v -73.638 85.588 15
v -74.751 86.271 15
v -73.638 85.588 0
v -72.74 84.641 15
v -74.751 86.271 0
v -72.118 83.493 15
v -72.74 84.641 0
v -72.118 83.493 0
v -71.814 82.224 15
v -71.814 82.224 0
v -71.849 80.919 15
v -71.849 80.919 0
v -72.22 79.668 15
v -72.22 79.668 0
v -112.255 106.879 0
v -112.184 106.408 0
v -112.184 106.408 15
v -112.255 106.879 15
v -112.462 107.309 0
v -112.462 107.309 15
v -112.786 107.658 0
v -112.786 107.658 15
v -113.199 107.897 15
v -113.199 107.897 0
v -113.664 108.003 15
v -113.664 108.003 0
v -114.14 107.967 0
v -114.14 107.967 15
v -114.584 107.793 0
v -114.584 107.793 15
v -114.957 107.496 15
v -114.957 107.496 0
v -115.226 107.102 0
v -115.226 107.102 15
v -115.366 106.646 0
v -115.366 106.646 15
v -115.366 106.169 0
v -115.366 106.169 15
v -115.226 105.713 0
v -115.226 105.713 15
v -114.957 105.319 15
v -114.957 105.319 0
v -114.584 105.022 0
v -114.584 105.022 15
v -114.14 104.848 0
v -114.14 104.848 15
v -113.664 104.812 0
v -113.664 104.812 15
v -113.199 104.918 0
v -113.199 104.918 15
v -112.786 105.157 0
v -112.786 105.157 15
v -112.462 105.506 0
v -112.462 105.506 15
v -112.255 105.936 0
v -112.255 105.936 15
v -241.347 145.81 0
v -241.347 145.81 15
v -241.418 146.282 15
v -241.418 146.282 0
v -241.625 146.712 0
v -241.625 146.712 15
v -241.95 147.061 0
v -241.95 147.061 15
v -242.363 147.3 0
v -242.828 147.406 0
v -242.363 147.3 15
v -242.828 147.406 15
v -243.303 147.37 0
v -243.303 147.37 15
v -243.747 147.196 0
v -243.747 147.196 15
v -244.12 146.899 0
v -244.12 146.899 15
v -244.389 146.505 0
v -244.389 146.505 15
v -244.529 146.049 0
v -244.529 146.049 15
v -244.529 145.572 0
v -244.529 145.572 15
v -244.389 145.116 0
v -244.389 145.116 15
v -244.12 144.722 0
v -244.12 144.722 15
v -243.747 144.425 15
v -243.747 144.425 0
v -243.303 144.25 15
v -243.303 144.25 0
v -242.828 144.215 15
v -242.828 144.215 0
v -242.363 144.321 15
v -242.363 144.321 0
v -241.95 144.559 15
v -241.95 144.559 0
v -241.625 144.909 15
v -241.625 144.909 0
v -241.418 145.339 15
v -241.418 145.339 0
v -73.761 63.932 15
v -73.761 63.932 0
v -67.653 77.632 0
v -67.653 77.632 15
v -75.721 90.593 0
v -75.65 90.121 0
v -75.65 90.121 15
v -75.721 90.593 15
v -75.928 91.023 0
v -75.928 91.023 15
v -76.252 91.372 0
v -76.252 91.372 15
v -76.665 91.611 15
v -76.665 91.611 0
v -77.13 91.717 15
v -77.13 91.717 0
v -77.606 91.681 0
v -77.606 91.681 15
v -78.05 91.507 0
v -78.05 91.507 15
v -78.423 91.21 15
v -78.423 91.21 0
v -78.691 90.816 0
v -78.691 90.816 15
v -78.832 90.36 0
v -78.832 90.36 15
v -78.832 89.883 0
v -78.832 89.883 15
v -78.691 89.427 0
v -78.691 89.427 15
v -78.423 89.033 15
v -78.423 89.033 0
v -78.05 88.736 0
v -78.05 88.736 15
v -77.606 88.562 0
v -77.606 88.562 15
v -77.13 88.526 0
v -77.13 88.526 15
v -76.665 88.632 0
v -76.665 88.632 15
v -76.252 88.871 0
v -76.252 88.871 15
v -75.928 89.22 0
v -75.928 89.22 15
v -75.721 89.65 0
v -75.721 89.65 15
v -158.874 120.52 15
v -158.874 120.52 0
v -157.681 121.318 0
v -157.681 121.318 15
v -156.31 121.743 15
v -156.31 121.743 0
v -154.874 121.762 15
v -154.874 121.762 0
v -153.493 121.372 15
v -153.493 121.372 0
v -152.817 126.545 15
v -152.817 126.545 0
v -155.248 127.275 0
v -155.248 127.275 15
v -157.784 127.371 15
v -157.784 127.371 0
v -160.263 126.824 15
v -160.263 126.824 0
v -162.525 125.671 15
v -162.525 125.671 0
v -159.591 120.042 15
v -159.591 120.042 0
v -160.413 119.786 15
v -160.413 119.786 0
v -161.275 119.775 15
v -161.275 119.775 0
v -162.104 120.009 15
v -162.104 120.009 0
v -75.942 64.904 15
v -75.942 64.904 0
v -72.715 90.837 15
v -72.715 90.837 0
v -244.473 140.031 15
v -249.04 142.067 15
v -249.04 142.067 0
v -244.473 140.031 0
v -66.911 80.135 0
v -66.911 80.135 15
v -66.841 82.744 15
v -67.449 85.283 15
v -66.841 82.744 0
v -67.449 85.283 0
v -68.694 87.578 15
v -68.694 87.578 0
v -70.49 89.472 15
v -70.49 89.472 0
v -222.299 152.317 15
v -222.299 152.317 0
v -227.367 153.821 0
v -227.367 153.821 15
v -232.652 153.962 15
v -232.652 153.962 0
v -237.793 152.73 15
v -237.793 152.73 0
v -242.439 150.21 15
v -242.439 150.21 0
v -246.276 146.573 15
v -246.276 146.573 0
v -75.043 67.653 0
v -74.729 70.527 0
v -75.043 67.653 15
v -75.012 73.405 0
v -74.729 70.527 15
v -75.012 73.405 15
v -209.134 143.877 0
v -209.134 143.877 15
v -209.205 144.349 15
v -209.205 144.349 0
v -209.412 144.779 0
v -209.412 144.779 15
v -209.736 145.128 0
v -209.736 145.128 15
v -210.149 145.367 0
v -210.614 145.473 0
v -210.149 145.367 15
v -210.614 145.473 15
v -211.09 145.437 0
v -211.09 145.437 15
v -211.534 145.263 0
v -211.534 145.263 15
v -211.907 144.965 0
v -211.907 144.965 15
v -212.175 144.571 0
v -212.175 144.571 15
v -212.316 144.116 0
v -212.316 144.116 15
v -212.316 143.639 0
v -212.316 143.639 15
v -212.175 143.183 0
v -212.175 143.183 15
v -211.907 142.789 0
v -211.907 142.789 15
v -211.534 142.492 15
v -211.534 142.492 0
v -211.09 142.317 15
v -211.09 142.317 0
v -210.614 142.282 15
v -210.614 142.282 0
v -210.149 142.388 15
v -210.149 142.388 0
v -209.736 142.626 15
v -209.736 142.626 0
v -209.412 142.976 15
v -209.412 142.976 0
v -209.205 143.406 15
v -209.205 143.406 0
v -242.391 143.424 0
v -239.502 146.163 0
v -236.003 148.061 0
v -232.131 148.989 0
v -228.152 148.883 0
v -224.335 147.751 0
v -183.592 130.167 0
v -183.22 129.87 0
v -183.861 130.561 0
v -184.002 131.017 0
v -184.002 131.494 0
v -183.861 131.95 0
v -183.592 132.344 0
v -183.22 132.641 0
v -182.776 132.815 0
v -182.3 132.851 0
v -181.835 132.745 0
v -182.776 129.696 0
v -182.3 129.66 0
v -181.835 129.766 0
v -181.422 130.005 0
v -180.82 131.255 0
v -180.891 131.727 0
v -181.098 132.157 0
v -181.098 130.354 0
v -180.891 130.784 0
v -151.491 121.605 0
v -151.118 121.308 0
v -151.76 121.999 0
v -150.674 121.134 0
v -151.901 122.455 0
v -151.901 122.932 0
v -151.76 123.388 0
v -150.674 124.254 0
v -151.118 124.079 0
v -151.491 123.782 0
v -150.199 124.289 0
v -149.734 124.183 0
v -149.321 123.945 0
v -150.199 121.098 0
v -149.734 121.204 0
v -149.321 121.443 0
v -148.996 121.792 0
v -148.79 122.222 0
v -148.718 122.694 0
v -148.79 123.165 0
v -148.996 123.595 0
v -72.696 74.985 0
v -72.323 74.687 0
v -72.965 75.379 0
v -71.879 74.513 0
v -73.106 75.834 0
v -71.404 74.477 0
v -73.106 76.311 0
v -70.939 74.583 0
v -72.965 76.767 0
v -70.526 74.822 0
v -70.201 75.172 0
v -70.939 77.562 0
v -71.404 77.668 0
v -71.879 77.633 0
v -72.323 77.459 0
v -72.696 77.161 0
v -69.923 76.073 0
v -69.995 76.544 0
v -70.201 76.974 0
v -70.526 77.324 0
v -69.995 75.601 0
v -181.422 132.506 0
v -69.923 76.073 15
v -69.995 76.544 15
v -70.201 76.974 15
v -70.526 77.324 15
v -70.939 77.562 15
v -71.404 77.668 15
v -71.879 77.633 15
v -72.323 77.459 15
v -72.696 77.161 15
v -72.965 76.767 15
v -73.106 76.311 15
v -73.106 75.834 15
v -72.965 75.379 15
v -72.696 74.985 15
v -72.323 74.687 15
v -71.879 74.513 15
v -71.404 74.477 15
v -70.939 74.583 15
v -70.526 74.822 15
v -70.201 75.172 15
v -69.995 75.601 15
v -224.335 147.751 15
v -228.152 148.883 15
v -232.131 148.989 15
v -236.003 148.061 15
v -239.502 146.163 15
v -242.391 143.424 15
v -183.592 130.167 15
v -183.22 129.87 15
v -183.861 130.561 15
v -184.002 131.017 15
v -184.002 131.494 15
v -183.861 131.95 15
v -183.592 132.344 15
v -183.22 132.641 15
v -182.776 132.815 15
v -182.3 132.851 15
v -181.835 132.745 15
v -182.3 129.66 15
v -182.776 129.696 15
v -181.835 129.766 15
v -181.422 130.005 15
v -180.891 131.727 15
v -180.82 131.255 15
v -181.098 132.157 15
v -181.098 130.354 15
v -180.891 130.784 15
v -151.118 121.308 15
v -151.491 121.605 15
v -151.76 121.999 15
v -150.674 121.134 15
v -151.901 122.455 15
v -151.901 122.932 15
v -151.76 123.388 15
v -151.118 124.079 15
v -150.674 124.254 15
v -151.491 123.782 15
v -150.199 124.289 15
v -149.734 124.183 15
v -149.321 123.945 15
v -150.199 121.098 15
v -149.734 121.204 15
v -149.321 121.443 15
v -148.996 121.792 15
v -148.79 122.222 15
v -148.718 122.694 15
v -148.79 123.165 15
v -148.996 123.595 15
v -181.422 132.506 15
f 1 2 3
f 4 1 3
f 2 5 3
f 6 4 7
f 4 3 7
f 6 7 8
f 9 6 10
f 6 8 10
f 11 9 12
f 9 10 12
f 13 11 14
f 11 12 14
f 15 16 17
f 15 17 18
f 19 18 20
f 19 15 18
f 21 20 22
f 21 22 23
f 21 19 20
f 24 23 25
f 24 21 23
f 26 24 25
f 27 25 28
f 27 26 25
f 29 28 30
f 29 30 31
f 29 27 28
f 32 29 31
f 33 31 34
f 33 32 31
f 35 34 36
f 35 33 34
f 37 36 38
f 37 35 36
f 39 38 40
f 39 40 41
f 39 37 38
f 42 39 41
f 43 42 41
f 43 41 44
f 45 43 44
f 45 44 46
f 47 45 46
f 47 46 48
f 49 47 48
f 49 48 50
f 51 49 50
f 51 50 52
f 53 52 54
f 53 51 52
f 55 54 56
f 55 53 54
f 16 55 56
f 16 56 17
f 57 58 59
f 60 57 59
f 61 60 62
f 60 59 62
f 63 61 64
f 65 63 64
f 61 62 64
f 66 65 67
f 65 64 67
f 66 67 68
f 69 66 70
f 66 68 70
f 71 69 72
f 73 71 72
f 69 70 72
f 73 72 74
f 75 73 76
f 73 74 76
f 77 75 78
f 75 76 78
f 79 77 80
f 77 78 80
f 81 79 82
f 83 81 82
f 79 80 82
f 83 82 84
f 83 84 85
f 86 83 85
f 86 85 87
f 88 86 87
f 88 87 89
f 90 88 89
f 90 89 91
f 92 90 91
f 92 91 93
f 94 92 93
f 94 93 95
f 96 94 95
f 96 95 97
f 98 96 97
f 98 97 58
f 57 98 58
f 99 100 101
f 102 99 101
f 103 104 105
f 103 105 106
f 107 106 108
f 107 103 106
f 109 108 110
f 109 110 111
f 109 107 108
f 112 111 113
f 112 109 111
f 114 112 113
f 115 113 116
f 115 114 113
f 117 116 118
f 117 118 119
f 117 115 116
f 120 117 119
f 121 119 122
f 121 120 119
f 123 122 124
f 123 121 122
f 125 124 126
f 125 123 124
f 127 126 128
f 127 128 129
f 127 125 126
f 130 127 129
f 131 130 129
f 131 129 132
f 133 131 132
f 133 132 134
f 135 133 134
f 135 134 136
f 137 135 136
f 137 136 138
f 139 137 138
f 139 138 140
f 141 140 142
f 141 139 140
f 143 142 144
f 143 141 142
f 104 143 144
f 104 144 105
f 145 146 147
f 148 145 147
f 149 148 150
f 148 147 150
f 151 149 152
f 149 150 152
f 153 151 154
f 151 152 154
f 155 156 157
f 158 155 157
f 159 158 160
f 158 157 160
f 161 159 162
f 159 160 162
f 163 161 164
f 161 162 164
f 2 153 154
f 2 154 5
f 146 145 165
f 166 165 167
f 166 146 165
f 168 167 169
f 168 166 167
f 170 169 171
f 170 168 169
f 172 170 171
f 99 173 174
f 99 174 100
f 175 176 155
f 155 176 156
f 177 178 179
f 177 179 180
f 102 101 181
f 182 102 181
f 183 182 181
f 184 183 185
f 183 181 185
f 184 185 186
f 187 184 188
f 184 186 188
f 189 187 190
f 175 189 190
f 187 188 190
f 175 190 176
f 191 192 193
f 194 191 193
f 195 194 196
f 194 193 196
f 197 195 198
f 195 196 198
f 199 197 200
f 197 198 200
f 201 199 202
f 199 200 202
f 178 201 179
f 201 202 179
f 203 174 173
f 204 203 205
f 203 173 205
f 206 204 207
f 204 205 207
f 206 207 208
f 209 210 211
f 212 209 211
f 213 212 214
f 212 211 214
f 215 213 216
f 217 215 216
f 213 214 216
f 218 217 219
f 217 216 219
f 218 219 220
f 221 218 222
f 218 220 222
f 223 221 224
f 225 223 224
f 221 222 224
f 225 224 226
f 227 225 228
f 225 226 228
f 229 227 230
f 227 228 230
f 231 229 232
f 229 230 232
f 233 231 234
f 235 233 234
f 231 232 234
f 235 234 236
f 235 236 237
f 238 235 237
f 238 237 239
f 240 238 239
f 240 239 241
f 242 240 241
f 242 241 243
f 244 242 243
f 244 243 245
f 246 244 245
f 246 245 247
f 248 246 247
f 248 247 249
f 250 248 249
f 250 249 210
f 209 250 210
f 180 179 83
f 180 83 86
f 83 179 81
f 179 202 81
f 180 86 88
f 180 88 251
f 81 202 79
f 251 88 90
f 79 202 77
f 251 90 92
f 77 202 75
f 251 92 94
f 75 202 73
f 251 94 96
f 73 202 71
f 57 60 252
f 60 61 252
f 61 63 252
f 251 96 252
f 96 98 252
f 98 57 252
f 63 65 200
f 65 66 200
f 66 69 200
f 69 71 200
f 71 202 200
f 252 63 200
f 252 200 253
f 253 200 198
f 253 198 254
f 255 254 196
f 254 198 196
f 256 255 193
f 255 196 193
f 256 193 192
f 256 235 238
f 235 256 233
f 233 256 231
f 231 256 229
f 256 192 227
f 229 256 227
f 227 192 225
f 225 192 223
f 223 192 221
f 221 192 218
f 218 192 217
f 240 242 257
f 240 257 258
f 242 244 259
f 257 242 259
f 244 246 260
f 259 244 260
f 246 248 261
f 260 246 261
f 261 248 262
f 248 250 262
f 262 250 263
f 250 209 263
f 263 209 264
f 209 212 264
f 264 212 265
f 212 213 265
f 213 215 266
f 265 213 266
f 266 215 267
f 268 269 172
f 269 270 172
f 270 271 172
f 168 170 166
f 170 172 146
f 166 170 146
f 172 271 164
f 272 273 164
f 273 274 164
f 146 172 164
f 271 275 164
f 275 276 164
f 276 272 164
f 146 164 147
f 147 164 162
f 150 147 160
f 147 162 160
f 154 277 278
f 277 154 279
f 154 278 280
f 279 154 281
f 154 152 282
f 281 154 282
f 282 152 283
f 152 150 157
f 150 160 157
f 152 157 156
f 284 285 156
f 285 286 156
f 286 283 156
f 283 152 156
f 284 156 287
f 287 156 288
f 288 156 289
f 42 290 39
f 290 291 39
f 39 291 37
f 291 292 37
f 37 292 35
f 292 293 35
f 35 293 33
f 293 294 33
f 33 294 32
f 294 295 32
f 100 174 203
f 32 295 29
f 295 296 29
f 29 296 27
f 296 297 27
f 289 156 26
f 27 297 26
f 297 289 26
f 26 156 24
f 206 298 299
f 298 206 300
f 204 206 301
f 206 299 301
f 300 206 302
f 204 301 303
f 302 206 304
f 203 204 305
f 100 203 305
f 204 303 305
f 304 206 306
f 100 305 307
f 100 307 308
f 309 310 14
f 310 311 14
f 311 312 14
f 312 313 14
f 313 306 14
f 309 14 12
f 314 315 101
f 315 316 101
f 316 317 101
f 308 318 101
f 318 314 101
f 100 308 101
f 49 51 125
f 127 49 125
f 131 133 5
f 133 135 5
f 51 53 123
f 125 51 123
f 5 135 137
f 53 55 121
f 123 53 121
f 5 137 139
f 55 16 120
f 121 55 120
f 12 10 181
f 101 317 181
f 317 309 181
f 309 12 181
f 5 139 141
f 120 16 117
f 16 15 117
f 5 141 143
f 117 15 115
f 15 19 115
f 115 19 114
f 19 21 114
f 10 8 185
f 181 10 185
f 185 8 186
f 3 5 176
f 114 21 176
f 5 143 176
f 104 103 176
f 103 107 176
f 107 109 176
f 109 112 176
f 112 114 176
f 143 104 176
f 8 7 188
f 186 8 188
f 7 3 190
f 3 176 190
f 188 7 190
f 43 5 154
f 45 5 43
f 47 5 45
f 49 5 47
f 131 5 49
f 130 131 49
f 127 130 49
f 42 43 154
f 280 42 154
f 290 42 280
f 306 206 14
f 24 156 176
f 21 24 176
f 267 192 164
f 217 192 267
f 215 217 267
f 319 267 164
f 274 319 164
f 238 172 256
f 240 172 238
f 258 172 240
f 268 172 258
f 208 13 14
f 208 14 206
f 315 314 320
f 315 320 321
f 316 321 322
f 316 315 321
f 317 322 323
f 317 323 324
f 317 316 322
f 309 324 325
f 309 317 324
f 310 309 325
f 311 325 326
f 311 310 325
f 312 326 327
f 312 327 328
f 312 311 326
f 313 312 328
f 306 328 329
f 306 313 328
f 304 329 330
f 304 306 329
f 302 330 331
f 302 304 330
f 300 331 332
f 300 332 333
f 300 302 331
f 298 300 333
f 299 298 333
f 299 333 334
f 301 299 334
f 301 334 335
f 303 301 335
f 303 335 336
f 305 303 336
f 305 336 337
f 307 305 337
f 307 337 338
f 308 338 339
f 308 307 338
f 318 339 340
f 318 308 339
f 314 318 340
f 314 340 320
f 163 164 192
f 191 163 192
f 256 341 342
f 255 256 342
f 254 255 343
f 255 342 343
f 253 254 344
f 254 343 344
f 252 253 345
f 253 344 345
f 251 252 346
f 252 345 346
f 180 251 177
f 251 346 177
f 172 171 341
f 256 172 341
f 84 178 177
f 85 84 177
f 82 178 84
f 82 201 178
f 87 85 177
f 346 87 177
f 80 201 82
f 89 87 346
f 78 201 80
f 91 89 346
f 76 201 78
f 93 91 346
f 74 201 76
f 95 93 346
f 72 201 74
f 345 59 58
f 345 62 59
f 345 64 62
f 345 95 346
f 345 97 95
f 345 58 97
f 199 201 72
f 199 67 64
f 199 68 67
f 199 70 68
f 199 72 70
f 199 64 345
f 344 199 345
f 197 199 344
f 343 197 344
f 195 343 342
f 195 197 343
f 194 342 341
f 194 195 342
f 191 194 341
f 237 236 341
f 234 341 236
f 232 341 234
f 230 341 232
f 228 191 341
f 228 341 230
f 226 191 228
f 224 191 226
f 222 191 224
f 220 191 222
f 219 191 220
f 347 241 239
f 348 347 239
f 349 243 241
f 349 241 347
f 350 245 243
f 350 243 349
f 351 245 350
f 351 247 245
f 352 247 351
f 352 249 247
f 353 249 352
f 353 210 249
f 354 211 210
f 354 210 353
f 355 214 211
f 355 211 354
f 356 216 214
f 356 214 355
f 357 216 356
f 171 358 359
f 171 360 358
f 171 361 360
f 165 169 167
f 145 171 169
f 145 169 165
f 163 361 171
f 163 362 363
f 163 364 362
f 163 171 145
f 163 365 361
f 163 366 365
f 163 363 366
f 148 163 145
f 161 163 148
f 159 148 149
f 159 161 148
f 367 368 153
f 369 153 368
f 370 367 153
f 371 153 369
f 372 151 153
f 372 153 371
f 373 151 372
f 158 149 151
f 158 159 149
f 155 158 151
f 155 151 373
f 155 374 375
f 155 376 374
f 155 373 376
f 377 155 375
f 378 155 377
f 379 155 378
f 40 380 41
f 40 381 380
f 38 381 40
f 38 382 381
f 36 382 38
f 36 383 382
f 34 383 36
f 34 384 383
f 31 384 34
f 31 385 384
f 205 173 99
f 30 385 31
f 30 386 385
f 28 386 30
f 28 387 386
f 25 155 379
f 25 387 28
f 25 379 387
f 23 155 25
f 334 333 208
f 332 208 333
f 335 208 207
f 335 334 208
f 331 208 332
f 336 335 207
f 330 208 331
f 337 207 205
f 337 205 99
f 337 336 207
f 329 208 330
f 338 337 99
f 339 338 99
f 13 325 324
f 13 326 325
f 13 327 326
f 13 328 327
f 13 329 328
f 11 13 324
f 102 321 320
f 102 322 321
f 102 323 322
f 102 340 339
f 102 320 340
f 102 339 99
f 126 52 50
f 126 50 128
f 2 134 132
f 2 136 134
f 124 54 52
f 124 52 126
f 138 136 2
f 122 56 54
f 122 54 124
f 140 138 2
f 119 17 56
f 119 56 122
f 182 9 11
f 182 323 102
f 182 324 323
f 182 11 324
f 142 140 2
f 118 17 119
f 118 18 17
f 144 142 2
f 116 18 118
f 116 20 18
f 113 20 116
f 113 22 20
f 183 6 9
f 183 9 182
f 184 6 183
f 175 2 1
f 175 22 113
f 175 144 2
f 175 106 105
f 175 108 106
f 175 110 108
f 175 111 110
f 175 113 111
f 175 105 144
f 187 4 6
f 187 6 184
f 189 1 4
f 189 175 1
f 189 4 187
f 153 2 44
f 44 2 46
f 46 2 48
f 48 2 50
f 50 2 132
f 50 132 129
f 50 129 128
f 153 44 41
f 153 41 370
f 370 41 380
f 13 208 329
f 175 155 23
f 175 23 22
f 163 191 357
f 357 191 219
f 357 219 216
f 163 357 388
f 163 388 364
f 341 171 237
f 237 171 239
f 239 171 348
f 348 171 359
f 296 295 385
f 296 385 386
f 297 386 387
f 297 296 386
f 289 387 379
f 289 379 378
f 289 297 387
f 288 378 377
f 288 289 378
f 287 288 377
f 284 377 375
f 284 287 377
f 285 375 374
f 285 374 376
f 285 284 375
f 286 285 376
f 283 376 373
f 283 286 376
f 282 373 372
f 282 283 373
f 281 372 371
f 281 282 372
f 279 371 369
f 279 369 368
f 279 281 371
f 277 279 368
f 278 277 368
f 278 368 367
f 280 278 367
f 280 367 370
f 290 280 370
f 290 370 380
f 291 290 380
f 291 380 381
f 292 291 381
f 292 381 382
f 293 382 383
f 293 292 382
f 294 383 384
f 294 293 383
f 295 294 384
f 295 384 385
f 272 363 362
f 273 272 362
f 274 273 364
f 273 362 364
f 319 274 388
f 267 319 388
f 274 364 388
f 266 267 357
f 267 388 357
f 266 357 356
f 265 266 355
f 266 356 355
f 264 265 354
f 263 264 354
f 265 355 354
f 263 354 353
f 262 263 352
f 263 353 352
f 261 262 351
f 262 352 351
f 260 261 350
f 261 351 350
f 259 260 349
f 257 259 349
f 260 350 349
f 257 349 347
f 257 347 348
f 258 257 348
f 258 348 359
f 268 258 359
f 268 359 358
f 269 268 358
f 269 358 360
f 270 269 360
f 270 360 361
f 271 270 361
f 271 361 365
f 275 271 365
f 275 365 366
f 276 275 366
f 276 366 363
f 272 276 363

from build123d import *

# Parameters (mm, degrees)
SKETCH1_R           = 14.25
SKETCH1_R_2         = 1.7
SKETCH1_R_3         = 1.6
BOSS_EXTRUDE1_DEPTH = 15
SKETCH5_R           = 1.25
SKETCH5_R_2         = 1.6
CUT_EXTRUDE4_DEPTH  = 16
CUT_EXTRUDE5_DEPTH  = 16
FILLET1_R           = 5
FILLET2_R           = 5
CUT_EXTRUDE6_DEPTH  = 16
CUT_EXTRUDE7_DEPTH  = 16
FILLET5_R           = 3
SKETCH9_R           = 14
CUT_EXTRUDE8_DEPTH  = 16


with BuildPart() as part:
    # Sketch1 → Boss-Extrude1 (new body)
    with BuildSketch(Plane.XY):
        with BuildLine():
            Line((-72.715301765, 90.837326721), (-152.817002247, 126.544575004))
            ThreePointArc((-152.817002247, 126.544575004), (-157.784388135, 127.370762315), (-162.524605276, 125.671394934))
            Line((-162.524605276, 125.671394934), (-222.299360222, 152.317421212))
            ThreePointArc((-222.299360222, 152.317421212), (-249.039738928, 142.066706765), (-238.78902448, 115.326328059))
            Line((-238.78902448, 115.326328059), (-179.014269534, 88.680301782))
            ThreePointArc((-179.014269534, 88.680301782), (-177.109561802, 84.018800254), (-173.174612442, 80.876558766))
            Line((-173.174612442, 80.876558766), (-93.072911961, 45.169310483))
            ThreePointArc((-93.072911961, 45.169310483), (-85.421957972, 44.965480094), (-79.867786674, 50.231391692))
            Line((-79.867786674, 50.231391692), (-67.653220557, 77.632201435))
            ThreePointArc((-67.653220557, 77.632201435), (-67.449390168, 85.283155423), (-72.715301765, 90.837326721))
        make_face()
        with Locations((-230.544192351, 133.821874636)):
            Circle(SKETCH1_R, mode=Mode.SUBTRACT)
        with Locations((-95.571468701, 49.02024728)):
            Circle(SKETCH1_R_2, mode=Mode.SUBTRACT)
        with Locations((-132.105881692, 65.306335437)):
            Circle(SKETCH1_R_2, mode=Mode.SUBTRACT)
        with Locations((-168.640294682, 81.592423593)):
            Circle(SKETCH1_R_2, mode=Mode.SUBTRACT)
        with Locations((-150.318445506, 122.693638207)):
            Circle(SKETCH1_R_3, mode=Mode.SUBTRACT)
        with Locations((-113.784032516, 106.407550051)):
            Circle(SKETCH1_R_3, mode=Mode.SUBTRACT)
        with Locations((-77.249619525, 90.121461895)):
            Circle(SKETCH1_R_3, mode=Mode.SUBTRACT)
        with Locations((-81.295075004, 54.152214057)):
            Circle(SKETCH1_R_2, mode=Mode.SUBTRACT)
        with Locations((-71.52342211, 76.072861852)):
            Circle(SKETCH1_R_3, mode=Mode.SUBTRACT)
        with Locations((-168.932649456, 106.357056211)):
            Circle(SKETCH1_R_2, mode=Mode.SUBTRACT)
    extrude(amount=BOSS_EXTRUDE1_DEPTH)

    # Sketch5 → Cut-Extrude4 (cut, through all)
    with BuildSketch(Plane.XY.offset(15)):
        with Locations((-196.466353254, 99.744559857)):
            Circle(SKETCH5_R)
        with Locations((-224.780523322, 112.366278179)):
            Circle(SKETCH5_R)
        with Locations((-210.733772287, 143.877209383)):
            Circle(SKETCH5_R_2)
        with Locations((-182.419602219, 131.255491062)):
            Circle(SKETCH5_R_2)
        with Locations((-242.947351213, 145.810375386)):
            Circle(SKETCH5_R_2)
        with Locations((-247.751623016, 135.033002179)):
            Circle(SKETCH5_R)
    extrude(amount=-CUT_EXTRUDE4_DEPTH, mode=Mode.SUBTRACT)

    # Sketch6 → Cut-Extrude5 (cut, through all)
    with BuildSketch(Plane.XY.offset(15)):
        Polygon((-158.059591703, 123.407293834), (-70.184261161, 84.234764078), (-86.470349317, 47.700351088), (-174.345679859, 86.872880843), align=None)
    extrude(amount=-CUT_EXTRUDE5_DEPTH, mode=Mode.SUBTRACT)

    # Fillet1
    fillet1_edges = [part.edges().sort_by_distance(p)[0] for p in [
        (-174.345679859, 86.872880843, 7.5),
        (-158.059591703, 123.407293834, 7.5),
    ]]
    fillet(fillet1_edges, radius=FILLET1_R)

    # Fillet2
    fillet2_edges = [part.edges().sort_by_distance(p)[0] for p in [
        (-70.184261161, 84.234764078, 7.5),
        (-86.470349317, 47.700351088, 7.5),
    ]]
    fillet(fillet2_edges, radius=FILLET2_R)

    # Sketch7 → Cut-Extrude6 (cut, through all)
    with BuildSketch(Plane.XY.offset(15)):
        Polygon((-249.039738928, 142.066706765), (-73.760503615, 63.931796563), (-92.871338518, 21.060658435), (-268.15057383, 99.195568636), align=None)
    extrude(amount=-CUT_EXTRUDE6_DEPTH, mode=Mode.SUBTRACT)

    # Sketch8 → Cut-Extrude7 (cut, through all)
    with BuildSketch(Plane.XY.offset(15)):
        with BuildLine():
            Line((-147.743052942, 113.607873768), (-224.335121242, 147.750619588))
            ThreePointArc((-224.335121242, 147.750619588), (-244.45553121, 140.069846398), (-236.831015973, 119.928050513))
            Line((-236.831015973, 119.928050513), (-160.324966884, 85.309789022))
            Line((-160.324966884, 85.309789022), (-147.743052942, 113.607873768))
        make_face()
    extrude(amount=-CUT_EXTRUDE7_DEPTH, mode=Mode.SUBTRACT)

    # Fillet5
    fillet5_edges = [part.edges().sort_by_distance(p)[0] for p in [
        (-159.987852597, 119.066285997, 7.5),
    ]]
    fillet(fillet5_edges, radius=FILLET5_R)

    # Sketch9 → Cut-Extrude8 (cut, through all)
    with BuildSketch(Plane.XY.offset(15)):
        with Locations((-88.728751121, 70.604250791)):
            Circle(SKETCH9_R)
    extrude(amount=-CUT_EXTRUDE8_DEPTH, mode=Mode.SUBTRACT)


solid = part.part
